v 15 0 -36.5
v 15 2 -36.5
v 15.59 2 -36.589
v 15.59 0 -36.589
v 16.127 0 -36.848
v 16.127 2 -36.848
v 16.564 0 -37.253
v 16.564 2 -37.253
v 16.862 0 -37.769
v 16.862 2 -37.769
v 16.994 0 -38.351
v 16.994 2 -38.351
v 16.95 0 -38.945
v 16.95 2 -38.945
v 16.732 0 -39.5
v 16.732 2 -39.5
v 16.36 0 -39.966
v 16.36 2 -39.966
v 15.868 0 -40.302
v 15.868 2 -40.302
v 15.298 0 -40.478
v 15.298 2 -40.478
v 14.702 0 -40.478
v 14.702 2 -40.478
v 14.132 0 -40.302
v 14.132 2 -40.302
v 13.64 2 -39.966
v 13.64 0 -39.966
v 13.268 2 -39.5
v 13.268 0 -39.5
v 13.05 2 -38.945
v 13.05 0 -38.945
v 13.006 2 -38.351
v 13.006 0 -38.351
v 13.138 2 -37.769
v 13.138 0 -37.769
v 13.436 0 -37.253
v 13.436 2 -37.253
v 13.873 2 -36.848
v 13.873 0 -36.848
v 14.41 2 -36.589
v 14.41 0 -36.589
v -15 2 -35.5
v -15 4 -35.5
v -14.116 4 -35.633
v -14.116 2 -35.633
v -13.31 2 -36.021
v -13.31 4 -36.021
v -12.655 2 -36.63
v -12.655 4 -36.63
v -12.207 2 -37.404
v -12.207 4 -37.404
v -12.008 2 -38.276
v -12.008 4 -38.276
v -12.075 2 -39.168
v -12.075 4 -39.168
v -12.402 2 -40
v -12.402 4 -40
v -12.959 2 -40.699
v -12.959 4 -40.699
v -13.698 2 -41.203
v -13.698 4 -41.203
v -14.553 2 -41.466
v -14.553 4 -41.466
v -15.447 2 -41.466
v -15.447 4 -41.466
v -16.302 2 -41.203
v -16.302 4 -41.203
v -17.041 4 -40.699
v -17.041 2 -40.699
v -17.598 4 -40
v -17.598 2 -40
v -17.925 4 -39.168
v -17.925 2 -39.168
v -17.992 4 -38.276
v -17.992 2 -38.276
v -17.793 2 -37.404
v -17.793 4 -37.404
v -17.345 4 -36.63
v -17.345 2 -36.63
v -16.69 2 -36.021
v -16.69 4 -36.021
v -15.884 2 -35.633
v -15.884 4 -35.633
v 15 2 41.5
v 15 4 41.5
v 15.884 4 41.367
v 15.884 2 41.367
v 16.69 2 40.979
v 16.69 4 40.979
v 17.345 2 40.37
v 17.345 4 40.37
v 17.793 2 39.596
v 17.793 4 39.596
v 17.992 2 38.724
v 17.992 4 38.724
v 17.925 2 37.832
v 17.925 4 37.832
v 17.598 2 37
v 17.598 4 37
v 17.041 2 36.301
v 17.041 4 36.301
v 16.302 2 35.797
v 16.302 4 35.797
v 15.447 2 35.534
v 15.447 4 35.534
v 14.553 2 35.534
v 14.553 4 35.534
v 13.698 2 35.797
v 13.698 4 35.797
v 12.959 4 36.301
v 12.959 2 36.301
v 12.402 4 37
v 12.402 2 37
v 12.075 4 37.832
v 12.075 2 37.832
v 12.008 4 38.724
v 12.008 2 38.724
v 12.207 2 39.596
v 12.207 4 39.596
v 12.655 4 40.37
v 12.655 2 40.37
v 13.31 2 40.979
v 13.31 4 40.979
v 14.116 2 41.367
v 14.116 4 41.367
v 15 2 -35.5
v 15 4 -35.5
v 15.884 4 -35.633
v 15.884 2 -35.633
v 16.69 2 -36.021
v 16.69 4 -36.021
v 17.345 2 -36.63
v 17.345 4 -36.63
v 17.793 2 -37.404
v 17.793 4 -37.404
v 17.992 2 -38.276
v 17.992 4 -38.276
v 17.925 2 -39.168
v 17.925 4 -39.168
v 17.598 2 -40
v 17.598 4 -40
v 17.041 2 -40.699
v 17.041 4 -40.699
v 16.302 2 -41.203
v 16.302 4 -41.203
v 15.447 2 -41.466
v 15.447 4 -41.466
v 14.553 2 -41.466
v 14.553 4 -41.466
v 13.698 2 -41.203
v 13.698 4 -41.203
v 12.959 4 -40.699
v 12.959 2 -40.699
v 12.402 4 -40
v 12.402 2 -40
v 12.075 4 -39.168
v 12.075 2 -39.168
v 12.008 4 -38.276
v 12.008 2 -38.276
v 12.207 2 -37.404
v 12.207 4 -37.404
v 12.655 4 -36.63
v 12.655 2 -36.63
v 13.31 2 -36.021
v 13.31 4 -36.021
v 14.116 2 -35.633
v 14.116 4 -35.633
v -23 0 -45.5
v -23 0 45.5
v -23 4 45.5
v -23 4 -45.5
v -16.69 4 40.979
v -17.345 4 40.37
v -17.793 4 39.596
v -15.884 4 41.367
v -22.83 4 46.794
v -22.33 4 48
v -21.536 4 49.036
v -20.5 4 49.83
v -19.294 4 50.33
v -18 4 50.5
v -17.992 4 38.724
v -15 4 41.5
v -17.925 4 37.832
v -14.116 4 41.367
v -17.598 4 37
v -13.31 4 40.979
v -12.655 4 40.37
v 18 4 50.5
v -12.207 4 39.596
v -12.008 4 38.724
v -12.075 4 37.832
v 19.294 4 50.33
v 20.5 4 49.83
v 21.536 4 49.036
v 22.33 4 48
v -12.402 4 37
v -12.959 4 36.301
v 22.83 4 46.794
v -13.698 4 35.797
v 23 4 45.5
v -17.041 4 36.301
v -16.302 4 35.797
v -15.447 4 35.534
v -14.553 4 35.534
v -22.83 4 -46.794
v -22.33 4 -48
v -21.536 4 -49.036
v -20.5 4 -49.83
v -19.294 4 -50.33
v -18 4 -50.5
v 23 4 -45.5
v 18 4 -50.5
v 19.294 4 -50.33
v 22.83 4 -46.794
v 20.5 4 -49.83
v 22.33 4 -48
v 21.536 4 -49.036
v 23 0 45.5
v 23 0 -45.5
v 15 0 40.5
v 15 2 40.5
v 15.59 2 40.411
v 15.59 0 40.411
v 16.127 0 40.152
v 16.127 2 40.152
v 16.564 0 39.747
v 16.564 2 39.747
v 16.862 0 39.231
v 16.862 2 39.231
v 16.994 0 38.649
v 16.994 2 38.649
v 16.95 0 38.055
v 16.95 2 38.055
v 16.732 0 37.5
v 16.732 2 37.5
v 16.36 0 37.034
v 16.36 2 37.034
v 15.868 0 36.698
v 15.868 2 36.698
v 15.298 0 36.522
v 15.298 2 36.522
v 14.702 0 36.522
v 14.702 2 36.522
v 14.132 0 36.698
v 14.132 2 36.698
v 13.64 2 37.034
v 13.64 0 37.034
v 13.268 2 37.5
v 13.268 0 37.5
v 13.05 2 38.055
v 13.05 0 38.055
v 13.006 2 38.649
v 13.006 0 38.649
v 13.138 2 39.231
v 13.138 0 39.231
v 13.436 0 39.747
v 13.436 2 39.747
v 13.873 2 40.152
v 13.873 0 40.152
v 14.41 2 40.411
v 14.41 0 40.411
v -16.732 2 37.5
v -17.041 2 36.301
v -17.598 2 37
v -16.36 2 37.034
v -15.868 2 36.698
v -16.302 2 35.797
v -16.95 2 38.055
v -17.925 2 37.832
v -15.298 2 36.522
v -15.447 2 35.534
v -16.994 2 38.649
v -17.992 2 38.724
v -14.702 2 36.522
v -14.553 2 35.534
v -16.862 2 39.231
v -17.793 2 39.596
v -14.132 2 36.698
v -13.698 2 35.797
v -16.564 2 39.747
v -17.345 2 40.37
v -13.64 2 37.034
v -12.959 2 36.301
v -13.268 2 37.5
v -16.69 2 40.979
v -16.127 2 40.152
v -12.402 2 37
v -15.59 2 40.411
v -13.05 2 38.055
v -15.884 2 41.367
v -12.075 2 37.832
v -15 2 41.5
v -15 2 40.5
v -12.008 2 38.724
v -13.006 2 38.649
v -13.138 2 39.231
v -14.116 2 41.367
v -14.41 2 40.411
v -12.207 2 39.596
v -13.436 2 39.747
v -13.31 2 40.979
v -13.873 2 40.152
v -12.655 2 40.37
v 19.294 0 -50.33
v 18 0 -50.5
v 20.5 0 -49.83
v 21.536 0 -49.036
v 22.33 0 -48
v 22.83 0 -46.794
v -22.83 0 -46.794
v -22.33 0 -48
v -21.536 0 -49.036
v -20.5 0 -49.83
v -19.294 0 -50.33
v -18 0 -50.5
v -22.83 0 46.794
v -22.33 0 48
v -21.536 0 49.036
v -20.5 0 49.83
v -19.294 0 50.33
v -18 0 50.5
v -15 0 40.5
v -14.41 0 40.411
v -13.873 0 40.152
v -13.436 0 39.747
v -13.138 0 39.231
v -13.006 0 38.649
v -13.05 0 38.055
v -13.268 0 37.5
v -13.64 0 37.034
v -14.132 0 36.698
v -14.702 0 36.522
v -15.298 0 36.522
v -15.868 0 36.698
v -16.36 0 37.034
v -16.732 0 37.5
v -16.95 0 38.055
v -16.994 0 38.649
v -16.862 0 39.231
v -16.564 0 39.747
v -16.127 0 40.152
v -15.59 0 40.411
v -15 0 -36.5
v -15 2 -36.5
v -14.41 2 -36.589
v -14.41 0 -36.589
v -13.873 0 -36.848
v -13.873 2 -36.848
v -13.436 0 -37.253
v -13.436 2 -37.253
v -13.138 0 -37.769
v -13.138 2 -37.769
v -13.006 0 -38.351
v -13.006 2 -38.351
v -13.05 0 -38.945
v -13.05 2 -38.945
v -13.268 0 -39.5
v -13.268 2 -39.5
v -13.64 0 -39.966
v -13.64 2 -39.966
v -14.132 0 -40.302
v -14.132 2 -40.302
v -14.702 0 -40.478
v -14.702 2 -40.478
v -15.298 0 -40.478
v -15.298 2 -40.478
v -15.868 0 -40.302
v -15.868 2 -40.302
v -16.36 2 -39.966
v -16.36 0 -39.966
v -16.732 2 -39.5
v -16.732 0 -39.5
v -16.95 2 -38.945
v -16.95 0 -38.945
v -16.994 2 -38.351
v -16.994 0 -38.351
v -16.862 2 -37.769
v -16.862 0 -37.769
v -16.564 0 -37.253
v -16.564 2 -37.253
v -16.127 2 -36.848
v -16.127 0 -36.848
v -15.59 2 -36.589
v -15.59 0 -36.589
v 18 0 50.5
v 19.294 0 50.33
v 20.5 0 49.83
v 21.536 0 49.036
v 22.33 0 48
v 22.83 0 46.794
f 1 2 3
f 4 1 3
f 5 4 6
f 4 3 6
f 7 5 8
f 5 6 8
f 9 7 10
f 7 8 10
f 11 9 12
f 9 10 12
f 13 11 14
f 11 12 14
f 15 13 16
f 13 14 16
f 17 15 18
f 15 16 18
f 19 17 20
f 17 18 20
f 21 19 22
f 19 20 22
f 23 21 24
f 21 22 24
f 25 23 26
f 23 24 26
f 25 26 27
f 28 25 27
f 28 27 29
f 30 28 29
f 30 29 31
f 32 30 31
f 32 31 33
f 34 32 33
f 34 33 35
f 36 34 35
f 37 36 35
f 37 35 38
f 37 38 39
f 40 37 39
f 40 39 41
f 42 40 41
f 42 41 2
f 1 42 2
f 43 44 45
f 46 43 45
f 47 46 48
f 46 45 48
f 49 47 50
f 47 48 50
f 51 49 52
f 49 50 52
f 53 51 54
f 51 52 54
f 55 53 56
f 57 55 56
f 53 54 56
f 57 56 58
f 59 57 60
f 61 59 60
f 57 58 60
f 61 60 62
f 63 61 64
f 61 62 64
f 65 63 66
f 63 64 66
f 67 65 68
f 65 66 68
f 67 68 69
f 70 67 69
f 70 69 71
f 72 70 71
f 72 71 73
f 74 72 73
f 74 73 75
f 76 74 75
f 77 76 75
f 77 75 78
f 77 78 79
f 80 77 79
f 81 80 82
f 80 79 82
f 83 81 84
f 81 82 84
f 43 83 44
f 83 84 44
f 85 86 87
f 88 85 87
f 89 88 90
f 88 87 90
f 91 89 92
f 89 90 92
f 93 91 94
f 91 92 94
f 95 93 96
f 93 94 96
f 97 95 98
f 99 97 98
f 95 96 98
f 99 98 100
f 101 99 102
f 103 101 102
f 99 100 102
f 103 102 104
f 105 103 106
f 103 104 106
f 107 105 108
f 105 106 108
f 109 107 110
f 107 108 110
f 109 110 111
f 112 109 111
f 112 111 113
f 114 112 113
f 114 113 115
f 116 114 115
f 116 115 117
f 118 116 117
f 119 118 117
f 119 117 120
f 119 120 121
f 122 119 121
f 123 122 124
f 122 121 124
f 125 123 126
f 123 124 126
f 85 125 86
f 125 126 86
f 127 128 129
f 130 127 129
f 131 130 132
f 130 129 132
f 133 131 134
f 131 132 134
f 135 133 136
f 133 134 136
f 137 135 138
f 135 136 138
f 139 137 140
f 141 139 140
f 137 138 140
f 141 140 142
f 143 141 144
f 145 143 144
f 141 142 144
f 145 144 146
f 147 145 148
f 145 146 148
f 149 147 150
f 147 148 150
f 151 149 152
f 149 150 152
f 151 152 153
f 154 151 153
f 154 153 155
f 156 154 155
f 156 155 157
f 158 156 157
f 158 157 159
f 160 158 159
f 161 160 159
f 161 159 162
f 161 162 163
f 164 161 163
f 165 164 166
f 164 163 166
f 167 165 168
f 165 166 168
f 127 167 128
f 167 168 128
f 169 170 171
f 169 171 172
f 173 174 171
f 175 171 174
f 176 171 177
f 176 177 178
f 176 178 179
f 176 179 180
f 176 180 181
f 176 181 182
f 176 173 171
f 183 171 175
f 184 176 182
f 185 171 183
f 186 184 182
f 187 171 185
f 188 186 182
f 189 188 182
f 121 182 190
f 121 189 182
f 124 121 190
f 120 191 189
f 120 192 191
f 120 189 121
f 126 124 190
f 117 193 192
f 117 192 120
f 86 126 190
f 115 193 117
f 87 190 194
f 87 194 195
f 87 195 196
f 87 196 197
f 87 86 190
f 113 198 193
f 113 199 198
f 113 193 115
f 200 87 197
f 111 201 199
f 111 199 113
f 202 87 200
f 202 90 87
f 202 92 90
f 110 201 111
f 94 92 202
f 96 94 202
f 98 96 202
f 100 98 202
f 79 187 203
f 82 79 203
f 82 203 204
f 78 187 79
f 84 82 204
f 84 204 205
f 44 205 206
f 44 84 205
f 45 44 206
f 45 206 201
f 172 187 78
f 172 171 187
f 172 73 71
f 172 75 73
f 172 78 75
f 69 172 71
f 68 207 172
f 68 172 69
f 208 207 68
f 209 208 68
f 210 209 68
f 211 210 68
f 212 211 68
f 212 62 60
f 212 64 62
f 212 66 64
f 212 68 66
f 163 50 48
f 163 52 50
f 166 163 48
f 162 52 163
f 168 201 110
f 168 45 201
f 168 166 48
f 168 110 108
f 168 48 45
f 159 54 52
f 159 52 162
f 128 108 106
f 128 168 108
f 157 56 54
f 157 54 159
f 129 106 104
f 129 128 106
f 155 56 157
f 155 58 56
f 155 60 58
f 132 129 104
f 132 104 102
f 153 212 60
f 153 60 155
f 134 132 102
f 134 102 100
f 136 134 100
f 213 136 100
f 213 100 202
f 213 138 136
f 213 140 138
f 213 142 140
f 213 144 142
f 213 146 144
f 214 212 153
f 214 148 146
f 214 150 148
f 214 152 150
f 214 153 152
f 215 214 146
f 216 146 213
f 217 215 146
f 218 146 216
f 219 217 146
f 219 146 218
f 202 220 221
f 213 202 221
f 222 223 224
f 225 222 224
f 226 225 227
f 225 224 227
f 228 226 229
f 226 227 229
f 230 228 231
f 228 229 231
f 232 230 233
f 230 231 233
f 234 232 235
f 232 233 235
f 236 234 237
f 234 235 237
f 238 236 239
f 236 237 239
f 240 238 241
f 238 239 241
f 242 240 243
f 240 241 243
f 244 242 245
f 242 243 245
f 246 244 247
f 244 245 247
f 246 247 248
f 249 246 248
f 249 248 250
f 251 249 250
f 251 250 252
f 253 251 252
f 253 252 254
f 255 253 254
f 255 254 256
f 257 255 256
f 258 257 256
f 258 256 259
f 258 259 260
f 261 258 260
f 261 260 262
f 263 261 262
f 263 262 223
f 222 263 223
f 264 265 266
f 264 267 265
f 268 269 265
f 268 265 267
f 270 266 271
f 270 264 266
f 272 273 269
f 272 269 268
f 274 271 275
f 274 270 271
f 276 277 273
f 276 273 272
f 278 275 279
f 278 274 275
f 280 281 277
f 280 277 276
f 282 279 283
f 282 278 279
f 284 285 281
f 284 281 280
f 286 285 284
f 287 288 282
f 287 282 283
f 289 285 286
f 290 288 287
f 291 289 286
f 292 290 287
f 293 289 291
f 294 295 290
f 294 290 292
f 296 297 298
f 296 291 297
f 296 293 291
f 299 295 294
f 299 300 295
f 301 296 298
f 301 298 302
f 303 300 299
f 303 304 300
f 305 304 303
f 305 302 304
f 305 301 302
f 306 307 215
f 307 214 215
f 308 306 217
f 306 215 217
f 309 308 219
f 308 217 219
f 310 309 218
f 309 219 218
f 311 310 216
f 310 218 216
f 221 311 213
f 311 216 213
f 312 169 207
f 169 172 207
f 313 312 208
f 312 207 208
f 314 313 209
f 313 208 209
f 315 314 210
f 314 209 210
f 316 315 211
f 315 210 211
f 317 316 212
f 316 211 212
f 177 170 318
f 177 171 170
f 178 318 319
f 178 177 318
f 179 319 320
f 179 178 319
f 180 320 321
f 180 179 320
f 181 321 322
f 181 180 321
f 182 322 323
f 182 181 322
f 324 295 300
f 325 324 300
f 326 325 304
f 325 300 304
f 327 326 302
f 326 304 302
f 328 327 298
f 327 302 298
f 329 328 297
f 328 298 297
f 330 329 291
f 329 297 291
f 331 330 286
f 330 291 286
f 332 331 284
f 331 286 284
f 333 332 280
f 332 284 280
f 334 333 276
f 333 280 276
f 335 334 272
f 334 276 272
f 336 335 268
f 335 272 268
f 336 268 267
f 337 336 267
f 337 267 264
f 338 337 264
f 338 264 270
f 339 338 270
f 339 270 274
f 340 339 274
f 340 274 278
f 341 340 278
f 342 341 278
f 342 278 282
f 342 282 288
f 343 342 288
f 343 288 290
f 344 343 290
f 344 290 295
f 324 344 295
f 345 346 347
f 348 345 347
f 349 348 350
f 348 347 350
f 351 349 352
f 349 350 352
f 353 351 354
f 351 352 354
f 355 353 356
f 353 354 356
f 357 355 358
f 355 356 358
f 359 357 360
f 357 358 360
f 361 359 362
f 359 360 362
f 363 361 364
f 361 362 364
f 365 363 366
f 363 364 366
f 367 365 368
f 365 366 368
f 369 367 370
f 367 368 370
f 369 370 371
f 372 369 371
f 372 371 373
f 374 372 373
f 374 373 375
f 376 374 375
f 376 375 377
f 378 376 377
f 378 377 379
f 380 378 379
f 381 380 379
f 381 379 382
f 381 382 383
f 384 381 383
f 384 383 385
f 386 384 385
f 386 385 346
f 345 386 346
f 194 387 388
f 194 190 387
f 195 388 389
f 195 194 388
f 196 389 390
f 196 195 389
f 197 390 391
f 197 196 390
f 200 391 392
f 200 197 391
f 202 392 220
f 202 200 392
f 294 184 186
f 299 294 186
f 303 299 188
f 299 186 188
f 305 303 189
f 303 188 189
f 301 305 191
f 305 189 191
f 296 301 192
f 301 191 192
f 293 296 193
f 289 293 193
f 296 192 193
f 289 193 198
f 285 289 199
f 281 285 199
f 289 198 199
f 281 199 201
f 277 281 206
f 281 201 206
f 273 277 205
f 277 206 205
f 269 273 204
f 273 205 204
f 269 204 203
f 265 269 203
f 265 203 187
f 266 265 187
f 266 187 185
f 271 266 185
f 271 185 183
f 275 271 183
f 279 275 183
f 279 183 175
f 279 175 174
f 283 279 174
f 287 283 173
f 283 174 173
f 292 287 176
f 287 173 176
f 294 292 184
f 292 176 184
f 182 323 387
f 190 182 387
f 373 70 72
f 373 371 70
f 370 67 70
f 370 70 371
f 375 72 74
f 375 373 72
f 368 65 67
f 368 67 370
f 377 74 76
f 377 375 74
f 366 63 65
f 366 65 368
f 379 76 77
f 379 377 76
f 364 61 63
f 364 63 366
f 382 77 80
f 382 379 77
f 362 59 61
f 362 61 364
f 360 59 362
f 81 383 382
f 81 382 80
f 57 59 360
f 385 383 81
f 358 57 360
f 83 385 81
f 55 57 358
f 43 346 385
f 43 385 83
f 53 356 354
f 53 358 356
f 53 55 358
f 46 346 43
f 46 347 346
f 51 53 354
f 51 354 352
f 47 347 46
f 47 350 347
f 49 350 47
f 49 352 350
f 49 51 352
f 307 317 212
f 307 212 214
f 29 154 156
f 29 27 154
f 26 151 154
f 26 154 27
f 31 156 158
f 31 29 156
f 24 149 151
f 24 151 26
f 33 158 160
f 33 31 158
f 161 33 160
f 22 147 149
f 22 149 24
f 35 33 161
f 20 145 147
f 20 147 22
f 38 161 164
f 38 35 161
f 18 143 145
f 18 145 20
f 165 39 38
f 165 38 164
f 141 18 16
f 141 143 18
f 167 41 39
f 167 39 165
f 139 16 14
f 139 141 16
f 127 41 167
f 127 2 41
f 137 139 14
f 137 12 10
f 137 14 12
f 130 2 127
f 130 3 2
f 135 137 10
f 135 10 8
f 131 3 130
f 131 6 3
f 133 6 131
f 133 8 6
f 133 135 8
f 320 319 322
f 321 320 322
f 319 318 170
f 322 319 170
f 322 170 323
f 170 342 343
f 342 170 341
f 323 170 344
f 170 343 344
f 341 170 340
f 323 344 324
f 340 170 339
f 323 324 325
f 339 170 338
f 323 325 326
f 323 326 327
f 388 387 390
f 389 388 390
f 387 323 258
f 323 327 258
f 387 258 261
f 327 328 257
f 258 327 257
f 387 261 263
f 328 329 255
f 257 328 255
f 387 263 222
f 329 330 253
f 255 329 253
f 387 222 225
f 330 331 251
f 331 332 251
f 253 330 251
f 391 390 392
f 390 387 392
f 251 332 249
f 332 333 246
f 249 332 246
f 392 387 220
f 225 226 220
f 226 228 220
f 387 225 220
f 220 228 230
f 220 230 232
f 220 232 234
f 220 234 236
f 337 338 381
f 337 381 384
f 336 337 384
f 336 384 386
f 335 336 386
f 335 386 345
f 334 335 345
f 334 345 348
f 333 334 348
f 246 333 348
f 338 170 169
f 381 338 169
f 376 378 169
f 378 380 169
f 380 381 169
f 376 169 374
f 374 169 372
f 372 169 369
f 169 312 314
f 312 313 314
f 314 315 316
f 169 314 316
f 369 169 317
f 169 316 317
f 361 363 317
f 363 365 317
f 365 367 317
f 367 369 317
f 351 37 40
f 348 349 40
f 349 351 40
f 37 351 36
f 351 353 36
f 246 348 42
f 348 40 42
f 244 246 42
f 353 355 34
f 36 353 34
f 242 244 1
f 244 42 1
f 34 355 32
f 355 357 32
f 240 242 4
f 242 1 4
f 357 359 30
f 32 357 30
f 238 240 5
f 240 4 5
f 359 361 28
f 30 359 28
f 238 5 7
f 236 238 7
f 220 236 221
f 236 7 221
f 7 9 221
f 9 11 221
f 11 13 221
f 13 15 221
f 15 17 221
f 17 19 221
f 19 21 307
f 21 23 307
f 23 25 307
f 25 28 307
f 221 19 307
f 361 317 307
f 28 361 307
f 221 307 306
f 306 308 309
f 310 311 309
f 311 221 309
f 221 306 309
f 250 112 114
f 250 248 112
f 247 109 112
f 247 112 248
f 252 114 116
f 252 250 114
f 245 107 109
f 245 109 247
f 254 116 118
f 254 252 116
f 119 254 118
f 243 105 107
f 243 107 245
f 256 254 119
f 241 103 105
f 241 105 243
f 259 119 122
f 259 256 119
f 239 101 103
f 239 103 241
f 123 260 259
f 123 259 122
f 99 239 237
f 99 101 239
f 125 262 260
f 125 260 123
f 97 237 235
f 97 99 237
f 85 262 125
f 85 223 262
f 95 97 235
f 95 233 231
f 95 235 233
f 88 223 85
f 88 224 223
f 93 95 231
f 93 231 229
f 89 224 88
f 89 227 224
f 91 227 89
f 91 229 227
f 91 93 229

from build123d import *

# Parameters (mm, degrees)
CROQUIS1_W              = 46
CROQUIS1_H              = 101
SALIENTE_EXTRUIR2_DEPTH = 4
CROQUIS2_R              = 2
CORTAR_EXTRUIR3_DEPTH   = 36
CROQUIS4_R              = 3
CORTAR_EXTRUIR4_DEPTH   = 2
REDONDEO1_R             = 5


with BuildPart() as part:
    # Croquis1 → Saliente-Extruir2 (new body)
    with BuildSketch(Plane(origin=(0, 0, 0), x_dir=(1, 0, 0), z_dir=(0, 1, 0))):
        Rectangle(CROQUIS1_W, CROQUIS1_H)
    extrude(amount=SALIENTE_EXTRUIR2_DEPTH)

    # Croquis2 → Cortar-Extruir3 (cut)
    with BuildSketch(Plane(origin=(0, 4, 0), x_dir=(1, 0, 0), z_dir=(0, 1, 0))):
        with Locations(Location((-15, 38.5, 0), (0, 0, 270))):
            Circle(CROQUIS2_R)
        with Locations(Location((15, 38.5, 0), (0, 0, 270))):
            Circle(CROQUIS2_R)
        with Locations(Location((-15, -38.5, 0), (0, 0, 270))):
            Circle(CROQUIS2_R)
        with Locations(Location((15, -38.5, 0), (0, 0, 270))):
            Circle(CROQUIS2_R)
    extrude(amount=-CORTAR_EXTRUIR3_DEPTH, mode=Mode.SUBTRACT)

    # Croquis4 → Cortar-Extruir4 (cut)
    with BuildSketch(Plane(origin=(0, 4, 0), x_dir=(1, 0, 0), z_dir=(0, 1, 0))):
        with Locations(Location((-15, -38.5, 0), (0, 0, 270))):
            Circle(CROQUIS4_R)
        with Locations(Location((15, -38.5, 0), (0, 0, 270))):
            Circle(CROQUIS4_R)
        with Locations(Location((-15, 38.5, 0), (0, 0, 270))):
            Circle(CROQUIS4_R)
        with Locations(Location((15, 38.5, 0), (0, 0, 270))):
            Circle(CROQUIS4_R)
    extrude(amount=-CORTAR_EXTRUIR4_DEPTH, mode=Mode.SUBTRACT)

    # Redondeo1
    redondeo1_edges = [part.edges().sort_by_distance(p)[0] for p in [
        (23, 2, 50.5),
        (-23, 2, 50.5),
        (-23, 2, -50.5),
        (23, 2, -50.5),
    ]]
    fillet(redondeo1_edges, radius=REDONDEO1_R)


solid = part.part
